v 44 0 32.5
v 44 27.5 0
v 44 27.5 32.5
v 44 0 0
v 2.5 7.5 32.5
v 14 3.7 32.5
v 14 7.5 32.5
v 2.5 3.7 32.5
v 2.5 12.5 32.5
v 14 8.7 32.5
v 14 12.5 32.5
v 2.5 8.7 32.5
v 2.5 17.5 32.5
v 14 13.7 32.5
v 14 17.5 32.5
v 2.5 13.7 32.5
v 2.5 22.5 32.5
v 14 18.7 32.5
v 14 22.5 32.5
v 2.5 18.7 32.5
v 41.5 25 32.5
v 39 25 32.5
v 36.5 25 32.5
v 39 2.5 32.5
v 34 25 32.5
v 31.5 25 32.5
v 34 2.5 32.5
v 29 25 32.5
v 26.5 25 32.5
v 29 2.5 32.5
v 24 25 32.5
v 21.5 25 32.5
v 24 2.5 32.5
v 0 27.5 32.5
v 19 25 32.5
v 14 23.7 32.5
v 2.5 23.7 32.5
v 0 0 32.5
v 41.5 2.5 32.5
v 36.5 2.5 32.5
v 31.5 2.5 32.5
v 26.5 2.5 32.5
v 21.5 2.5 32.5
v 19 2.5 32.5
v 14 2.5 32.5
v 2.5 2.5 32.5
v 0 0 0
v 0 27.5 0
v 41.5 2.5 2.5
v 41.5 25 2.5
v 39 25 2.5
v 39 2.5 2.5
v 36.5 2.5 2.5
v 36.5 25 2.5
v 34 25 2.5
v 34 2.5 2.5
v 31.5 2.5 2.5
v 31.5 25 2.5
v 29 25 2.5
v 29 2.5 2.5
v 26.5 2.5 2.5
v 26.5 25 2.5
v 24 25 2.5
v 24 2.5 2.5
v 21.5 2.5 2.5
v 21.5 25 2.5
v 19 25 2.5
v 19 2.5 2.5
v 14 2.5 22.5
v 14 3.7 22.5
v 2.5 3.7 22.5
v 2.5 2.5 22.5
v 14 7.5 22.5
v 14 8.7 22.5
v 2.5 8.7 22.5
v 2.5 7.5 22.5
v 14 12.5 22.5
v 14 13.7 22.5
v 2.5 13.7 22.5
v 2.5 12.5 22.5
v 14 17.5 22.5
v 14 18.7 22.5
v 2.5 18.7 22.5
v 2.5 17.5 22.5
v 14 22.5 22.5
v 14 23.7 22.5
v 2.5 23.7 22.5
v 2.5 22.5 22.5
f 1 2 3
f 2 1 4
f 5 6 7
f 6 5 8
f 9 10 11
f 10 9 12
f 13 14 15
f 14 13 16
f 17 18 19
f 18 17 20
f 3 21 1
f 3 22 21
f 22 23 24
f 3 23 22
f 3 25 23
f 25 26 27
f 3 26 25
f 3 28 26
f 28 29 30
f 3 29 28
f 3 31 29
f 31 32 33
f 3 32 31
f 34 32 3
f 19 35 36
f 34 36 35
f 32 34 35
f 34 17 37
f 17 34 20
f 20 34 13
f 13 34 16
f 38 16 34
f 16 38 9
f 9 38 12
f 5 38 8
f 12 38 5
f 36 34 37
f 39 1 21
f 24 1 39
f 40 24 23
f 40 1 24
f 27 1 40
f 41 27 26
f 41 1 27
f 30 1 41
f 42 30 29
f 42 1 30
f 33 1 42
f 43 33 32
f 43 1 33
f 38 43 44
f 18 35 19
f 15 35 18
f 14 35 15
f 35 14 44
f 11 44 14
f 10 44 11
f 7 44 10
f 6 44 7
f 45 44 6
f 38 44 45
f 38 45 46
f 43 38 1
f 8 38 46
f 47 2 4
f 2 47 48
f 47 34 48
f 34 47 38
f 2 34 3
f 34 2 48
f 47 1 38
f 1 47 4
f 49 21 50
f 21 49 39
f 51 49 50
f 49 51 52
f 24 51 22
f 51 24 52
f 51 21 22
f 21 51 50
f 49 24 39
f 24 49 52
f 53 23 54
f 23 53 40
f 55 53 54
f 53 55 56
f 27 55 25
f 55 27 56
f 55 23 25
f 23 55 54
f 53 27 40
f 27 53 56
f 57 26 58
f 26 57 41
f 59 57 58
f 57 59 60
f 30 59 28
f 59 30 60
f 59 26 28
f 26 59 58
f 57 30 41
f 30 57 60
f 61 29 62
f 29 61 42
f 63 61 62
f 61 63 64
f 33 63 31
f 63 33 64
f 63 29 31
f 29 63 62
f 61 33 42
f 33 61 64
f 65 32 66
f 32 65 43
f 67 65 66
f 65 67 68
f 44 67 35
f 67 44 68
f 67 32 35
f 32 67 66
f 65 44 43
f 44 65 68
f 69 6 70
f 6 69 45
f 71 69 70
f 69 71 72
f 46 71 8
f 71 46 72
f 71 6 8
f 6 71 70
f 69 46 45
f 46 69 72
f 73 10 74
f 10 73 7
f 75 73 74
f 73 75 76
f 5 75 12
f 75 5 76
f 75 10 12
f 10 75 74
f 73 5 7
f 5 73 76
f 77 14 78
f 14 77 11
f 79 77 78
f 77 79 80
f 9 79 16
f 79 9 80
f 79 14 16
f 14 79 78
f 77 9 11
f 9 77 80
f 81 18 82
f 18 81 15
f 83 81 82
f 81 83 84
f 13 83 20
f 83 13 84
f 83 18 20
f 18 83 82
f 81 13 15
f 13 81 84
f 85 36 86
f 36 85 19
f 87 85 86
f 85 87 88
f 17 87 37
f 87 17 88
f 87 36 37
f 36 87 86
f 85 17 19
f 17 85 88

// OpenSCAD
// stand for NVME and
// MicroSD cards
// 11.10.2025 Sebastian Weigl
 
// set the fregment sizes
$fn = $preview ? 48 : 64;

// vars
border=2.5;

fir_box_width=44;
fir_box_depth=27.5;
fir_box_height=32.5;

sec_box_width=2.5;
sec_box_depth=22.5;
sec_box_height=30;

thi_box_width=11.5;
thi_box_depth=1.2;
thi_box_height=10;

// object
difference() {
cube([fir_box_width,fir_box_depth,fir_box_height],false);
translate([fir_box_width-5,border,border])
#cube([sec_box_width,sec_box_depth,sec_box_height],false);
translate([fir_box_width-10,border,border])
#cube([sec_box_width,sec_box_depth,sec_box_height],false);
translate([fir_box_width-15,border,border])
#cube([sec_box_width,sec_box_depth,sec_box_height],false);
translate([fir_box_width-20,border,border])
#cube([sec_box_width,sec_box_depth,sec_box_height],false);
translate([fir_box_width-25,border,border])
#cube([sec_box_width,sec_box_depth,sec_box_height],false);

translate([border,border,fir_box_height-thi_box_height])
#cube([thi_box_width,thi_box_depth,thi_box_height],false);
translate([border,border+5,fir_box_height-thi_box_height])
#cube([thi_box_width,thi_box_depth,thi_box_height],false);
translate([border,border+10,fir_box_height-thi_box_height])
#cube([thi_box_width,thi_box_depth,thi_box_height],false);
translate([border,border+15,fir_box_height-thi_box_height])
#cube([thi_box_width,thi_box_depth,thi_box_height],false);
translate([border,border+20,fir_box_height-thi_box_height])
#cube([thi_box_width,thi_box_depth,thi_box_height],false);
}
